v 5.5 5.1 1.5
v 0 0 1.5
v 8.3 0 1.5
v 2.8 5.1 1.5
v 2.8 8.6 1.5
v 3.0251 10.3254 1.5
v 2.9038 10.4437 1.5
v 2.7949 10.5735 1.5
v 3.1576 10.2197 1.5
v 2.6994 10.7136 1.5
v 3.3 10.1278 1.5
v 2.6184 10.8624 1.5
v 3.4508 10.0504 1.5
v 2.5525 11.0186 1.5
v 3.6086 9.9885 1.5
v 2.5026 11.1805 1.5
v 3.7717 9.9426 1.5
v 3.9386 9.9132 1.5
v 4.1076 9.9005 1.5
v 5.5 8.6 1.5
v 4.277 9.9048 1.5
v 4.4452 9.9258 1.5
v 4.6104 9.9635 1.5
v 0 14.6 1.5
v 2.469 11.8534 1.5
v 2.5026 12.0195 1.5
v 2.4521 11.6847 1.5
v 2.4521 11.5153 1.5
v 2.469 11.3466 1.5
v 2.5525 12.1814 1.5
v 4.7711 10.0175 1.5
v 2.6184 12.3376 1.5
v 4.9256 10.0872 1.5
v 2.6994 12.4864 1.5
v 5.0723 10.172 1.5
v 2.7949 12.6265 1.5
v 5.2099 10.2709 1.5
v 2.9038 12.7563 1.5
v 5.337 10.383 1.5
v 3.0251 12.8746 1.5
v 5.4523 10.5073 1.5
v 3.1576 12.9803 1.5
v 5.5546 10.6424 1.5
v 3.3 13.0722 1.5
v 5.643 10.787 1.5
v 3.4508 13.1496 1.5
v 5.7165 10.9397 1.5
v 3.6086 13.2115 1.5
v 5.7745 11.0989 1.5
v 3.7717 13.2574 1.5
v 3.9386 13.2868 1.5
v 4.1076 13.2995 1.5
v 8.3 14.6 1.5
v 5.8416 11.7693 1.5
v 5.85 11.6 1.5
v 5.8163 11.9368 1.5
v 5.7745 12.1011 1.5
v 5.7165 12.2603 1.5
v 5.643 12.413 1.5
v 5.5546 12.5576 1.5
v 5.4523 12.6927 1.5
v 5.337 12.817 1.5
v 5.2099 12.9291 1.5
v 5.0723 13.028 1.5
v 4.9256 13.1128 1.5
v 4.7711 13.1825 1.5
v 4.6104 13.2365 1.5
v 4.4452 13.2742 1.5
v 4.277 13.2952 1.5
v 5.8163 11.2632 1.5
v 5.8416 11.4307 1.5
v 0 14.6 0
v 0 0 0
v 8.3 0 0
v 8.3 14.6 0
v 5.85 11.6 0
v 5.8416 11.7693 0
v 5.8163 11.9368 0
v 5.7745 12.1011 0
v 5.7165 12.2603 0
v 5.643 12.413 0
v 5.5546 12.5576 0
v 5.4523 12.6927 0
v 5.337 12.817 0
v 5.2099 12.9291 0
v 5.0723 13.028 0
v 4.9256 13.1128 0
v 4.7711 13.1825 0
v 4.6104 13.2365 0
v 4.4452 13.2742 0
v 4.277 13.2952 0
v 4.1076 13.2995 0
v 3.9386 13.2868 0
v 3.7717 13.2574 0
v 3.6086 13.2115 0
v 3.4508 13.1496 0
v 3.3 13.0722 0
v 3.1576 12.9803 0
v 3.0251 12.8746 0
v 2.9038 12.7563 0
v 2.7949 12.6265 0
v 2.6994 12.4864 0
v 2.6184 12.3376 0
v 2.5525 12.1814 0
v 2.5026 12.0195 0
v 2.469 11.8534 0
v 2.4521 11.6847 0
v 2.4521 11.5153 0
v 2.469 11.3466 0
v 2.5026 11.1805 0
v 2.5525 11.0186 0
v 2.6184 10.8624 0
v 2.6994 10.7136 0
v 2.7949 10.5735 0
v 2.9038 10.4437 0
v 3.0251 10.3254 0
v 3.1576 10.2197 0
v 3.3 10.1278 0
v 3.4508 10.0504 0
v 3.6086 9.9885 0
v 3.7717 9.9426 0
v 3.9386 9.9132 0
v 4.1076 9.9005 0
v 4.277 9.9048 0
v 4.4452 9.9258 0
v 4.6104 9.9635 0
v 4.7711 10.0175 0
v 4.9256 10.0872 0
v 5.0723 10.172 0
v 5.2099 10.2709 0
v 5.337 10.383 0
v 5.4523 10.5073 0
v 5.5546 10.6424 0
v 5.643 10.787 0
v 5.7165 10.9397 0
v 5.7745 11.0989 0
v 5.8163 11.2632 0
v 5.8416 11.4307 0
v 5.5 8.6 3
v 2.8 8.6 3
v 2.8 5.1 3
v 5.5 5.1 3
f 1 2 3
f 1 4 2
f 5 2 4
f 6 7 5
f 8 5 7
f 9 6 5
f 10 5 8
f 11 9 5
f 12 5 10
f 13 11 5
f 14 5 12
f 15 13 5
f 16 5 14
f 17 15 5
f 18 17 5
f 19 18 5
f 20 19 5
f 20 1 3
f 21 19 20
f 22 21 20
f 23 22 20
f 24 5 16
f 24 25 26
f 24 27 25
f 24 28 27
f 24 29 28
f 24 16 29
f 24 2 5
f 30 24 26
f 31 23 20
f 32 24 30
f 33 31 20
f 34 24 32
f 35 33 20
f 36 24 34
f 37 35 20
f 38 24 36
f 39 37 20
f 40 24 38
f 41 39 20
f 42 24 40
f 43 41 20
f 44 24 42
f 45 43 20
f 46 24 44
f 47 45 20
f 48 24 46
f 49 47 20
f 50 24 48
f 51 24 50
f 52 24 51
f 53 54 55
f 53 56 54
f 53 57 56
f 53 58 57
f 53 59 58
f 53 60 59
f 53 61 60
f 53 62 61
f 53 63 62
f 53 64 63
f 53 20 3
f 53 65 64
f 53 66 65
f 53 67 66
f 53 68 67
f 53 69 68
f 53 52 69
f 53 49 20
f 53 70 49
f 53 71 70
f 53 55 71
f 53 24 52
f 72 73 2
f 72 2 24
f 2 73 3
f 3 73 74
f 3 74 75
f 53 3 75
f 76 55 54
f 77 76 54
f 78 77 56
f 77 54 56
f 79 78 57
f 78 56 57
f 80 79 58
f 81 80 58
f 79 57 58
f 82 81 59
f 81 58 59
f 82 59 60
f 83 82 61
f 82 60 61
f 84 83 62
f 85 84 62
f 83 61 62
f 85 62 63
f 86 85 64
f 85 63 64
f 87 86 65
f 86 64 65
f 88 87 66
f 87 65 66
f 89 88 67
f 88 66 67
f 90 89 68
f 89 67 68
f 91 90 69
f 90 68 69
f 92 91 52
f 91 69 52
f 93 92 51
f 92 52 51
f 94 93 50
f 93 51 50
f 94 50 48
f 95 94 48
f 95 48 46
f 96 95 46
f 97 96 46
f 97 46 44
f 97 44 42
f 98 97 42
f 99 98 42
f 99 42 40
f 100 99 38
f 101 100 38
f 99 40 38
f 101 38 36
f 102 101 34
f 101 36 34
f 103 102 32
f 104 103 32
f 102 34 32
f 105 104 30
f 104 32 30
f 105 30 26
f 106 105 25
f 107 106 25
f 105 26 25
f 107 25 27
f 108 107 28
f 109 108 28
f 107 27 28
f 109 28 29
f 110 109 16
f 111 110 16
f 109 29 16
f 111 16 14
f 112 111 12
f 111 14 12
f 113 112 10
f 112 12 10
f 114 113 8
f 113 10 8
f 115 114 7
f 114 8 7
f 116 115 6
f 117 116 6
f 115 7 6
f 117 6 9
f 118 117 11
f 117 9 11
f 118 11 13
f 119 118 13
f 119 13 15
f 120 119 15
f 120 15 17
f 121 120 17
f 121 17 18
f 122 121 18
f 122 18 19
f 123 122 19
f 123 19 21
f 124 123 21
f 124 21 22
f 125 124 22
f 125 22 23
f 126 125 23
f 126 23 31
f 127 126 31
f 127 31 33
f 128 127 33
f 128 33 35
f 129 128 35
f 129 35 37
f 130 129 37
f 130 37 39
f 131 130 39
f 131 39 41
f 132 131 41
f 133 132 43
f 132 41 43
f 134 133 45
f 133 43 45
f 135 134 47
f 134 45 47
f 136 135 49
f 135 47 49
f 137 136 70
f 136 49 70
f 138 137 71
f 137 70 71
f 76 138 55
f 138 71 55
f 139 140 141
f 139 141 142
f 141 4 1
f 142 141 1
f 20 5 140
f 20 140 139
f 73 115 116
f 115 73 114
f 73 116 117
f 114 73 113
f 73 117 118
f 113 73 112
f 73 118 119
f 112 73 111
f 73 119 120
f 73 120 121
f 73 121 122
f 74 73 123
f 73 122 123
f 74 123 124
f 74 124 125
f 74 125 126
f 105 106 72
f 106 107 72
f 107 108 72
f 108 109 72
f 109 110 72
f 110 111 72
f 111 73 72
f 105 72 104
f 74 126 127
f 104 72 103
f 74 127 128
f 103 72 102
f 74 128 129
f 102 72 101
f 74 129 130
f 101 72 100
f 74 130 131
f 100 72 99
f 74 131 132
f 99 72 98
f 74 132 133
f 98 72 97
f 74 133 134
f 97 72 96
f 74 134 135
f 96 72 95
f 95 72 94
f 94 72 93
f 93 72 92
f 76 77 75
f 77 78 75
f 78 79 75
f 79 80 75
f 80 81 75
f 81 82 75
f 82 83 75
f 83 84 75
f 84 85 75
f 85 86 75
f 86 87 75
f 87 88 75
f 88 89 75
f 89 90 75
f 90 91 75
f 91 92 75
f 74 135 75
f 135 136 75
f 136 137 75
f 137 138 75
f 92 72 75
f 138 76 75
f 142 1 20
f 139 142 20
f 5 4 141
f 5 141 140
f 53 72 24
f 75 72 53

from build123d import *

# Parameters (mm, degrees)
SKETCH1_W           = 8.3
SKETCH1_H           = 14.6
BOSS_EXTRUDE1_DEPTH = 1.5
SKETCH2_R           = 1.7
CUT_EXTRUDE1_DEPTH  = 1.5
SKETCH3_W           = 2.7
SKETCH3_H           = 3.5
BOSS_EXTRUDE3_DEPTH = 1.5


with BuildPart() as part:
    # Sketch1 → Boss-Extrude1 (new body)
    with BuildSketch(Plane.XY):
        with Locations((4.15, 7.3)):
            Rectangle(SKETCH1_W, SKETCH1_H)
    extrude(amount=BOSS_EXTRUDE1_DEPTH)

    # Sketch2 → Cut-Extrude1 (cut)
    with BuildSketch(Plane.XY.offset(1.5)):
        with Locations((4.15, 11.6)):
            Circle(SKETCH2_R)
    extrude(amount=-CUT_EXTRUDE1_DEPTH, mode=Mode.SUBTRACT)

    # Sketch3 → Boss-Extrude3 (add)
    with BuildSketch(Plane.XY.offset(1.5)):
        with Locations((4.15, 6.85)):
            Rectangle(SKETCH3_W, SKETCH3_H)
    extrude(amount=BOSS_EXTRUDE3_DEPTH)


solid = part.part
